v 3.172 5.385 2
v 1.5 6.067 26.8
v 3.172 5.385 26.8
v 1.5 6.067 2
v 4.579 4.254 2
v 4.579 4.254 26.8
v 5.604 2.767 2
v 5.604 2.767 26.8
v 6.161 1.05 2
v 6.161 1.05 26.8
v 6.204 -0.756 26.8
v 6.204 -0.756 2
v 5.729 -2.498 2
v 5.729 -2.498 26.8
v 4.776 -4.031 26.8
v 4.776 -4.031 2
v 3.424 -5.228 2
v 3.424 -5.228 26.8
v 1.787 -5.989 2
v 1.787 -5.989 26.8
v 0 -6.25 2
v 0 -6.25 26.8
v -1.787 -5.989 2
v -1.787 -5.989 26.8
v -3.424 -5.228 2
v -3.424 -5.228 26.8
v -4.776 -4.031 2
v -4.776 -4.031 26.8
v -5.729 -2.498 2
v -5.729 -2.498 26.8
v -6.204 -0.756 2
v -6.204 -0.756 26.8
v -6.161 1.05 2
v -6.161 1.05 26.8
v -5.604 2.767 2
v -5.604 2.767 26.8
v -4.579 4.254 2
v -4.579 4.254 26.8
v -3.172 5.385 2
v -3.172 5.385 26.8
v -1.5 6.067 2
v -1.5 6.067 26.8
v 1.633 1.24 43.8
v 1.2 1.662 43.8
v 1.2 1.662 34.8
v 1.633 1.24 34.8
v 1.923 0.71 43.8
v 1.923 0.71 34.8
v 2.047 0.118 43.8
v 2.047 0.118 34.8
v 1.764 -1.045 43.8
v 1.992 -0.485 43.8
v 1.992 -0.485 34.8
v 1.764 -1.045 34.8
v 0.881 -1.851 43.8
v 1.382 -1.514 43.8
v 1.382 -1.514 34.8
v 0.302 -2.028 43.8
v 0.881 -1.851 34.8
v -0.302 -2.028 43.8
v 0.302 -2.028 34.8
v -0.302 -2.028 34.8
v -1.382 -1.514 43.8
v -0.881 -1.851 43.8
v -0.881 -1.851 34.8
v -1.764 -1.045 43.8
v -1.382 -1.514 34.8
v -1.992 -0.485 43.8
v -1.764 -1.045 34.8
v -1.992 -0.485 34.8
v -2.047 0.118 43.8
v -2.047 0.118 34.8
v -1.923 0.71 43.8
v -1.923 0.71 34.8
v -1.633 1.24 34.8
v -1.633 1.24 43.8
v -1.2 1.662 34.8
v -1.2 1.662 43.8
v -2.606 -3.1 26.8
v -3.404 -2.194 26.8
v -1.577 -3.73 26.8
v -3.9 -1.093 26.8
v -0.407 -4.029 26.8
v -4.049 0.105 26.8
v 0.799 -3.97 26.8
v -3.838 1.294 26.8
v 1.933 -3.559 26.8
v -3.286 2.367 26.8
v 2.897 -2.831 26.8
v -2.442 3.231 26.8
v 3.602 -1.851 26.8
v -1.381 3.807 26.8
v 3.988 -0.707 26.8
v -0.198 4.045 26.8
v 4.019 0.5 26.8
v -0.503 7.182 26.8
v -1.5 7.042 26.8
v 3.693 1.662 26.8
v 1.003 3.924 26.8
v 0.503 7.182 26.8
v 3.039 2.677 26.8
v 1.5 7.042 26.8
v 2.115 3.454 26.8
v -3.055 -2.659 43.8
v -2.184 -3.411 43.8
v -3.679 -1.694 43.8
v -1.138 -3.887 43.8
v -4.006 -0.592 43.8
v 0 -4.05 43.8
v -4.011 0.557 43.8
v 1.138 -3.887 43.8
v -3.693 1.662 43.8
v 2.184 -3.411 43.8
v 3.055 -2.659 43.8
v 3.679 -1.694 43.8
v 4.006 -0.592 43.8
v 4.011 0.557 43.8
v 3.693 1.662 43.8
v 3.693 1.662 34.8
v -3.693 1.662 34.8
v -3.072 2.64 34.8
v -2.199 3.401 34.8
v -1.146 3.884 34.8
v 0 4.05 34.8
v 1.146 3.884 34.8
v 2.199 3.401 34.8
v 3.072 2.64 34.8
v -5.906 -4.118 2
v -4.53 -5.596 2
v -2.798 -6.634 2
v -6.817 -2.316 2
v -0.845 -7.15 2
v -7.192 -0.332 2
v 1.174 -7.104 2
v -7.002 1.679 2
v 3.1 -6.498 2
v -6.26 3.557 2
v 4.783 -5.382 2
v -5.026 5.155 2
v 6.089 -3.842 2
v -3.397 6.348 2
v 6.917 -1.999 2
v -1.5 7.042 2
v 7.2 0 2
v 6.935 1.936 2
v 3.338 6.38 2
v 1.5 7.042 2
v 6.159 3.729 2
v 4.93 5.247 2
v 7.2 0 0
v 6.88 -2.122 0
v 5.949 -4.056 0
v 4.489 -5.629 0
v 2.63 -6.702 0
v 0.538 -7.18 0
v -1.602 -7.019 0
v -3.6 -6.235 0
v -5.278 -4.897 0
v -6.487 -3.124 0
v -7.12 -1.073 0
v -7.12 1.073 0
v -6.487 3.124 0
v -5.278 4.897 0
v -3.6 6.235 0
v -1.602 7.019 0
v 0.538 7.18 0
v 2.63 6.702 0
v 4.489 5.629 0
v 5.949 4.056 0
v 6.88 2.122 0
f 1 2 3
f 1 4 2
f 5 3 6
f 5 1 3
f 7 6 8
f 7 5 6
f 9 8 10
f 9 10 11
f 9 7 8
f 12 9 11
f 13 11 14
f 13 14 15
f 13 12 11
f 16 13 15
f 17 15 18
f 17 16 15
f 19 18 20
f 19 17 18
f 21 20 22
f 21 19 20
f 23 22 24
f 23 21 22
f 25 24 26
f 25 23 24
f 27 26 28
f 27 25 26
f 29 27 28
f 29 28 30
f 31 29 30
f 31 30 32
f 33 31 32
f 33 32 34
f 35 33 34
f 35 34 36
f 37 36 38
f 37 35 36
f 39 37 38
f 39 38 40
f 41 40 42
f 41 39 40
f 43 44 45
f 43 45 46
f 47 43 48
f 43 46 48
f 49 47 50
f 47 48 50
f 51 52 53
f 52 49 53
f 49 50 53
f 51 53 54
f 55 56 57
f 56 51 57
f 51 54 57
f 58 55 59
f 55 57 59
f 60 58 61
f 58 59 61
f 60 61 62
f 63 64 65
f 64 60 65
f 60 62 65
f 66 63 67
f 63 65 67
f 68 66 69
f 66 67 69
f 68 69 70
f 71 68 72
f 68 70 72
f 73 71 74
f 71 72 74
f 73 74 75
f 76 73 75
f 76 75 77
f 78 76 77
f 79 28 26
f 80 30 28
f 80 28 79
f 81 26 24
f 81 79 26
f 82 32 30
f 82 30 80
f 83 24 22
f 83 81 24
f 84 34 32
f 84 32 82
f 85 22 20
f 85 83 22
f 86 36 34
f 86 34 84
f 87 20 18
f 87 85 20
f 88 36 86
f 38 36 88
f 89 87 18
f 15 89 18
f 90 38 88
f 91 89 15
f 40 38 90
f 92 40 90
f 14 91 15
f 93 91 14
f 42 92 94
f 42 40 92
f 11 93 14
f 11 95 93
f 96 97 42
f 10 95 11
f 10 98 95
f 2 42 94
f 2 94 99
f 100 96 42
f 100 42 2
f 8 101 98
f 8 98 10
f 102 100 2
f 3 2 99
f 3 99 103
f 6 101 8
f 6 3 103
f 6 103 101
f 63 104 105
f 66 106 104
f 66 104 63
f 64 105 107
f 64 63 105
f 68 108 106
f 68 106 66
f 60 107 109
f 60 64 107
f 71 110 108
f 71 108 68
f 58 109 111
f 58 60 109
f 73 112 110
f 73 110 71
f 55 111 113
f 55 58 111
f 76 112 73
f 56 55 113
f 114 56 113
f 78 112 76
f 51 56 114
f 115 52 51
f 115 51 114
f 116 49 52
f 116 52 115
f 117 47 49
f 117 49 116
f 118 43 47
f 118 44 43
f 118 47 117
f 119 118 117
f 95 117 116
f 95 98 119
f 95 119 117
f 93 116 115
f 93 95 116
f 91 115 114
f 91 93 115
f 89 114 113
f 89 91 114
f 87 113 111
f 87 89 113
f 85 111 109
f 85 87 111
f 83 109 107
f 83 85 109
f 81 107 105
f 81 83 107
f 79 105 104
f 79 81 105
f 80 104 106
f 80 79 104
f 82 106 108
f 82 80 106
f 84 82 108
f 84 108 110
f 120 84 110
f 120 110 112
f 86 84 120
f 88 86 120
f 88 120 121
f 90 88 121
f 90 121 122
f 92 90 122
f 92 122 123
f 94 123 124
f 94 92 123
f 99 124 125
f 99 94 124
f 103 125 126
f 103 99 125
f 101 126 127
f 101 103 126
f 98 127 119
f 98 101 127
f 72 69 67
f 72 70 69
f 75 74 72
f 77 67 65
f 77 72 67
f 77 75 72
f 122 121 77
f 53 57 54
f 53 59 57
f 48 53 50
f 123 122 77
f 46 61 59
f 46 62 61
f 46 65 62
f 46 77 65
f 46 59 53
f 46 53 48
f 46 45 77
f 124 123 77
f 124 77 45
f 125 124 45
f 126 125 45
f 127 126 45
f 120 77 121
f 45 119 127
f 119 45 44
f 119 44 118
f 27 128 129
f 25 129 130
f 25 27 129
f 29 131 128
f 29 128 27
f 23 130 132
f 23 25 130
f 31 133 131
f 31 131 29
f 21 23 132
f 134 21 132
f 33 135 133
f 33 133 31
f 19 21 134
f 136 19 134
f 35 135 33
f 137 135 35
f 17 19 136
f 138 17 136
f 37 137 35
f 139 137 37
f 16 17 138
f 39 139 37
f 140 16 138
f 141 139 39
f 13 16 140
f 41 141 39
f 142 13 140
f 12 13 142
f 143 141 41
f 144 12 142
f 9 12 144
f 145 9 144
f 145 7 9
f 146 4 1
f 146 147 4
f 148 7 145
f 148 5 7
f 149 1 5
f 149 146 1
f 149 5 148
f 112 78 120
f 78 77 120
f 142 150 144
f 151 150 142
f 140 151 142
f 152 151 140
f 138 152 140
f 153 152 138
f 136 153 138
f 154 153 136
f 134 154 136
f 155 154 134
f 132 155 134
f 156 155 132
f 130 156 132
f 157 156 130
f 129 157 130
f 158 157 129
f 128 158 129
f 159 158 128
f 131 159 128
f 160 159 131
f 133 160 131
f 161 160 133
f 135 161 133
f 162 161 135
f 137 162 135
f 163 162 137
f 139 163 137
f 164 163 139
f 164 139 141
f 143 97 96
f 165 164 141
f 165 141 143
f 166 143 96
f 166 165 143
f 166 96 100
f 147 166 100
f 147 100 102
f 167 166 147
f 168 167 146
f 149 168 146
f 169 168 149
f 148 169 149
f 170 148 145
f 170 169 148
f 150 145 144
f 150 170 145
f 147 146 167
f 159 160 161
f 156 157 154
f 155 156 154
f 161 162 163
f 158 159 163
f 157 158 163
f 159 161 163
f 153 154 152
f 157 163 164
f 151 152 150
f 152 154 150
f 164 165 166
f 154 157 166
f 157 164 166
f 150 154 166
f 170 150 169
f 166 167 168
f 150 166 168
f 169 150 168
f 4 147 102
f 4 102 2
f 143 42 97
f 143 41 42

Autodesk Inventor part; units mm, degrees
ref_plane "YZ Plane" through (0, 0, 0) normal (1, 0, 0) x (0, 1, 0)
ref_plane "XZ Plane" through (0, 0, 0) normal (0, 1, 0) x (-1, 0, 0)
ref_plane "XY Plane" through (0, 0, 0) normal (0, 0, 1) x (1, 0, 0)
sketch "スケッチ1" plane through (0, 0, 0) normal (0, 0, 1) x (1, 0, 0)
  circle A0 centre (0, 0) radius 7.2
  dimension "d0" = 14.4
extrude "押し出し1" add sketch "スケッチ1" along normal blind 2
sketch "スケッチ2" plane through (0, 0, 2) normal (0, 0, 1) x (1, 0, 0)
  circle A0 centre (0, 0) radius 6.25
  line L0 (-1.5, 6.0673) -> (-1.5, 7.042)
  circle A1 centre (0, 0) radius 7.2 projected
  line L1 (1.5, 7.042) -> (1.5, 6.0673)
  dimension "d3" = 12.5
  dimension "d6" = 1.5
  dimension "d7" = 1.5
extrude "押し出し2" add sketch "スケッチ2" along normal blind 24.8 contours A0 | A0 L0 A1 L1 picked at (1.1681, 6.4463)
sketch "スケッチ3" plane through (0, 0, 26.8) normal (0, 0, 1) x (1, 0, 0)
  circle A0 centre (0, 0) radius 4.05
  circle A1 centre (0, 0) radius 2.05
  line L0 (-1.2, 1.6621) -> (1.2, 1.6621)
  line L1 (-1.2, 1.6621) -> (-3.6932, 1.6621)
  line L2 (1.2, 1.6621) -> (3.6932, 1.6621)
  dimension "d8" = 8.1
  dimension "d9" = 4.1
  dimension "d10" = 2.4
extrude "押し出し3" add sketch "スケッチ3" along normal blind 17 contours A0 L1 A1 L2 picked at (3.3454, -0.3178)
extrude "押し出し4" add sketch "スケッチ3" along normal blind 8 contours L2 A1 L1 A0 | L0 A1 | A1 L0 picked at (-2.7038, 1.9277)
equation "\"d7\" = d6"
properties part number "SU22_3DP_EncorderUnit_Bar_sn" material "ABS プラスチック"
